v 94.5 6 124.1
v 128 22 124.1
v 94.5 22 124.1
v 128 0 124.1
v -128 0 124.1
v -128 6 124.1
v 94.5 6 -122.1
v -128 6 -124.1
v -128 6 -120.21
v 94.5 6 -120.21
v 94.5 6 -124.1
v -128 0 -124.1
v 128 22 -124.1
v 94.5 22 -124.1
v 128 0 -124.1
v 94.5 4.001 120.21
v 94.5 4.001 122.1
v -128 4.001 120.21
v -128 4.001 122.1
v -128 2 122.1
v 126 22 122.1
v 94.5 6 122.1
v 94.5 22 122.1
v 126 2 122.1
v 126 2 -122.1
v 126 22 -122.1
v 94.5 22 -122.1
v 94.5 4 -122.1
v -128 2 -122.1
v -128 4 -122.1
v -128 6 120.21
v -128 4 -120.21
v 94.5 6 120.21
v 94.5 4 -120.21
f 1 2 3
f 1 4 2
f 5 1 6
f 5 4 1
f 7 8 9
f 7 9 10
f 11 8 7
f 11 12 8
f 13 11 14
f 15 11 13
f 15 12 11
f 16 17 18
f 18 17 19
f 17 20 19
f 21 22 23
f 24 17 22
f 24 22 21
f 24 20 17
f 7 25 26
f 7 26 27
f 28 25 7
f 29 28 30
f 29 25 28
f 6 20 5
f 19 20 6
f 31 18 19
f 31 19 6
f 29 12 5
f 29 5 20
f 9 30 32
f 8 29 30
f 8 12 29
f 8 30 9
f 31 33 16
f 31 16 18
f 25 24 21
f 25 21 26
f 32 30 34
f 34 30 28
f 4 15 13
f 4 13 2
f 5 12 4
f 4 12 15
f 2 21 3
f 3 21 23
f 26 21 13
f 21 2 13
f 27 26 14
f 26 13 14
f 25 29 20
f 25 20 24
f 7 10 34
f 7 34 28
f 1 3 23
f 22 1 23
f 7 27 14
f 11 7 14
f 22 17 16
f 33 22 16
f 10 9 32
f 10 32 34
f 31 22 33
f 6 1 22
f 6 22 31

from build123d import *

# Parameters (mm, degrees)
SKETCH1_W           = 256
SKETCH1_H           = 248.2
BOSS_EXTRUDE1_DEPTH = 2
SKETCH2_W           = 256
SKETCH2_H           = 2
BOSS_EXTRUDE2_DEPTH = 4
SKETCH3_W           = 256
SKETCH3_H           = 1.999419648
BOSS_EXTRUDE3_DEPTH = 1.89
SKETCH4_W           = 256
SKETCH4_H           = 2
BOSS_EXTRUDE4_DEPTH = 1.89
SKETCH5_W           = 33.5
SKETCH5_H           = 3.89
CUT_EXTRUDE1_DEPTH  = 10
BOSS_EXTRUDE5_DEPTH = 20


with BuildPart() as part:
    # Sketch1 → Boss-Extrude1 (new body)
    with BuildSketch(Plane(origin=(0, 0, 0), x_dir=(1, 0, 0), z_dir=(0, 1, 0))):
        Rectangle(SKETCH1_W, SKETCH1_H)
    extrude(amount=BOSS_EXTRUDE1_DEPTH)

    # Sketch2 → Boss-Extrude2 (add)
    with BuildSketch(Plane(origin=(0, 2, 0), x_dir=(1, 0, 0), z_dir=(0, 1, 0))):
        with Locations((0, -123.1)):
            Rectangle(SKETCH2_W, SKETCH2_H)
        with Locations((0, 123.1)):
            Rectangle(SKETCH2_W, SKETCH2_H)
    extrude(amount=BOSS_EXTRUDE2_DEPTH)

    # Sketch3 → Boss-Extrude3 (add)
    with BuildSketch(Plane(origin=(0, 0, 122.1), x_dir=(-1, 0, 0), z_dir=(0, 0, -1))):
        with Locations((0, 5.000290176)):
            Rectangle(SKETCH3_W, SKETCH3_H)
    extrude(amount=BOSS_EXTRUDE3_DEPTH)

    # Sketch4 → Boss-Extrude4 (add)
    with BuildSketch(Plane.XY.offset(-122.1)):
        with Locations((0, 5)):
            Rectangle(SKETCH4_W, SKETCH4_H)
    extrude(amount=BOSS_EXTRUDE4_DEPTH)

    # Sketch5 → Cut-Extrude1 (cut)
    with BuildSketch(Plane(origin=(0, 2, 0), x_dir=(1, 0, 0), z_dir=(0, 1, 0))):
        with Locations((111.25, -122.155)):
            Rectangle(SKETCH5_W, SKETCH5_H)
        with Locations((111.25, 122.155)):
            Rectangle(SKETCH5_W, SKETCH5_H)
    extrude(amount=CUT_EXTRUDE1_DEPTH, mode=Mode.SUBTRACT)

    # Sketch6 → Boss-Extrude5 (add)
    with BuildSketch(Plane(origin=(0, 2, 0), x_dir=(1, 0, 0), z_dir=(0, 1, 0))):
        Polygon((94.5, -124.1), (94.5, -122.1), (126, -122.1), (126, 122.1), (94.5, 122.1), (94.5, 124.1), (128, 124.1), (128, -124.1), align=None)
    extrude(amount=BOSS_EXTRUDE5_DEPTH)


solid = part.part
